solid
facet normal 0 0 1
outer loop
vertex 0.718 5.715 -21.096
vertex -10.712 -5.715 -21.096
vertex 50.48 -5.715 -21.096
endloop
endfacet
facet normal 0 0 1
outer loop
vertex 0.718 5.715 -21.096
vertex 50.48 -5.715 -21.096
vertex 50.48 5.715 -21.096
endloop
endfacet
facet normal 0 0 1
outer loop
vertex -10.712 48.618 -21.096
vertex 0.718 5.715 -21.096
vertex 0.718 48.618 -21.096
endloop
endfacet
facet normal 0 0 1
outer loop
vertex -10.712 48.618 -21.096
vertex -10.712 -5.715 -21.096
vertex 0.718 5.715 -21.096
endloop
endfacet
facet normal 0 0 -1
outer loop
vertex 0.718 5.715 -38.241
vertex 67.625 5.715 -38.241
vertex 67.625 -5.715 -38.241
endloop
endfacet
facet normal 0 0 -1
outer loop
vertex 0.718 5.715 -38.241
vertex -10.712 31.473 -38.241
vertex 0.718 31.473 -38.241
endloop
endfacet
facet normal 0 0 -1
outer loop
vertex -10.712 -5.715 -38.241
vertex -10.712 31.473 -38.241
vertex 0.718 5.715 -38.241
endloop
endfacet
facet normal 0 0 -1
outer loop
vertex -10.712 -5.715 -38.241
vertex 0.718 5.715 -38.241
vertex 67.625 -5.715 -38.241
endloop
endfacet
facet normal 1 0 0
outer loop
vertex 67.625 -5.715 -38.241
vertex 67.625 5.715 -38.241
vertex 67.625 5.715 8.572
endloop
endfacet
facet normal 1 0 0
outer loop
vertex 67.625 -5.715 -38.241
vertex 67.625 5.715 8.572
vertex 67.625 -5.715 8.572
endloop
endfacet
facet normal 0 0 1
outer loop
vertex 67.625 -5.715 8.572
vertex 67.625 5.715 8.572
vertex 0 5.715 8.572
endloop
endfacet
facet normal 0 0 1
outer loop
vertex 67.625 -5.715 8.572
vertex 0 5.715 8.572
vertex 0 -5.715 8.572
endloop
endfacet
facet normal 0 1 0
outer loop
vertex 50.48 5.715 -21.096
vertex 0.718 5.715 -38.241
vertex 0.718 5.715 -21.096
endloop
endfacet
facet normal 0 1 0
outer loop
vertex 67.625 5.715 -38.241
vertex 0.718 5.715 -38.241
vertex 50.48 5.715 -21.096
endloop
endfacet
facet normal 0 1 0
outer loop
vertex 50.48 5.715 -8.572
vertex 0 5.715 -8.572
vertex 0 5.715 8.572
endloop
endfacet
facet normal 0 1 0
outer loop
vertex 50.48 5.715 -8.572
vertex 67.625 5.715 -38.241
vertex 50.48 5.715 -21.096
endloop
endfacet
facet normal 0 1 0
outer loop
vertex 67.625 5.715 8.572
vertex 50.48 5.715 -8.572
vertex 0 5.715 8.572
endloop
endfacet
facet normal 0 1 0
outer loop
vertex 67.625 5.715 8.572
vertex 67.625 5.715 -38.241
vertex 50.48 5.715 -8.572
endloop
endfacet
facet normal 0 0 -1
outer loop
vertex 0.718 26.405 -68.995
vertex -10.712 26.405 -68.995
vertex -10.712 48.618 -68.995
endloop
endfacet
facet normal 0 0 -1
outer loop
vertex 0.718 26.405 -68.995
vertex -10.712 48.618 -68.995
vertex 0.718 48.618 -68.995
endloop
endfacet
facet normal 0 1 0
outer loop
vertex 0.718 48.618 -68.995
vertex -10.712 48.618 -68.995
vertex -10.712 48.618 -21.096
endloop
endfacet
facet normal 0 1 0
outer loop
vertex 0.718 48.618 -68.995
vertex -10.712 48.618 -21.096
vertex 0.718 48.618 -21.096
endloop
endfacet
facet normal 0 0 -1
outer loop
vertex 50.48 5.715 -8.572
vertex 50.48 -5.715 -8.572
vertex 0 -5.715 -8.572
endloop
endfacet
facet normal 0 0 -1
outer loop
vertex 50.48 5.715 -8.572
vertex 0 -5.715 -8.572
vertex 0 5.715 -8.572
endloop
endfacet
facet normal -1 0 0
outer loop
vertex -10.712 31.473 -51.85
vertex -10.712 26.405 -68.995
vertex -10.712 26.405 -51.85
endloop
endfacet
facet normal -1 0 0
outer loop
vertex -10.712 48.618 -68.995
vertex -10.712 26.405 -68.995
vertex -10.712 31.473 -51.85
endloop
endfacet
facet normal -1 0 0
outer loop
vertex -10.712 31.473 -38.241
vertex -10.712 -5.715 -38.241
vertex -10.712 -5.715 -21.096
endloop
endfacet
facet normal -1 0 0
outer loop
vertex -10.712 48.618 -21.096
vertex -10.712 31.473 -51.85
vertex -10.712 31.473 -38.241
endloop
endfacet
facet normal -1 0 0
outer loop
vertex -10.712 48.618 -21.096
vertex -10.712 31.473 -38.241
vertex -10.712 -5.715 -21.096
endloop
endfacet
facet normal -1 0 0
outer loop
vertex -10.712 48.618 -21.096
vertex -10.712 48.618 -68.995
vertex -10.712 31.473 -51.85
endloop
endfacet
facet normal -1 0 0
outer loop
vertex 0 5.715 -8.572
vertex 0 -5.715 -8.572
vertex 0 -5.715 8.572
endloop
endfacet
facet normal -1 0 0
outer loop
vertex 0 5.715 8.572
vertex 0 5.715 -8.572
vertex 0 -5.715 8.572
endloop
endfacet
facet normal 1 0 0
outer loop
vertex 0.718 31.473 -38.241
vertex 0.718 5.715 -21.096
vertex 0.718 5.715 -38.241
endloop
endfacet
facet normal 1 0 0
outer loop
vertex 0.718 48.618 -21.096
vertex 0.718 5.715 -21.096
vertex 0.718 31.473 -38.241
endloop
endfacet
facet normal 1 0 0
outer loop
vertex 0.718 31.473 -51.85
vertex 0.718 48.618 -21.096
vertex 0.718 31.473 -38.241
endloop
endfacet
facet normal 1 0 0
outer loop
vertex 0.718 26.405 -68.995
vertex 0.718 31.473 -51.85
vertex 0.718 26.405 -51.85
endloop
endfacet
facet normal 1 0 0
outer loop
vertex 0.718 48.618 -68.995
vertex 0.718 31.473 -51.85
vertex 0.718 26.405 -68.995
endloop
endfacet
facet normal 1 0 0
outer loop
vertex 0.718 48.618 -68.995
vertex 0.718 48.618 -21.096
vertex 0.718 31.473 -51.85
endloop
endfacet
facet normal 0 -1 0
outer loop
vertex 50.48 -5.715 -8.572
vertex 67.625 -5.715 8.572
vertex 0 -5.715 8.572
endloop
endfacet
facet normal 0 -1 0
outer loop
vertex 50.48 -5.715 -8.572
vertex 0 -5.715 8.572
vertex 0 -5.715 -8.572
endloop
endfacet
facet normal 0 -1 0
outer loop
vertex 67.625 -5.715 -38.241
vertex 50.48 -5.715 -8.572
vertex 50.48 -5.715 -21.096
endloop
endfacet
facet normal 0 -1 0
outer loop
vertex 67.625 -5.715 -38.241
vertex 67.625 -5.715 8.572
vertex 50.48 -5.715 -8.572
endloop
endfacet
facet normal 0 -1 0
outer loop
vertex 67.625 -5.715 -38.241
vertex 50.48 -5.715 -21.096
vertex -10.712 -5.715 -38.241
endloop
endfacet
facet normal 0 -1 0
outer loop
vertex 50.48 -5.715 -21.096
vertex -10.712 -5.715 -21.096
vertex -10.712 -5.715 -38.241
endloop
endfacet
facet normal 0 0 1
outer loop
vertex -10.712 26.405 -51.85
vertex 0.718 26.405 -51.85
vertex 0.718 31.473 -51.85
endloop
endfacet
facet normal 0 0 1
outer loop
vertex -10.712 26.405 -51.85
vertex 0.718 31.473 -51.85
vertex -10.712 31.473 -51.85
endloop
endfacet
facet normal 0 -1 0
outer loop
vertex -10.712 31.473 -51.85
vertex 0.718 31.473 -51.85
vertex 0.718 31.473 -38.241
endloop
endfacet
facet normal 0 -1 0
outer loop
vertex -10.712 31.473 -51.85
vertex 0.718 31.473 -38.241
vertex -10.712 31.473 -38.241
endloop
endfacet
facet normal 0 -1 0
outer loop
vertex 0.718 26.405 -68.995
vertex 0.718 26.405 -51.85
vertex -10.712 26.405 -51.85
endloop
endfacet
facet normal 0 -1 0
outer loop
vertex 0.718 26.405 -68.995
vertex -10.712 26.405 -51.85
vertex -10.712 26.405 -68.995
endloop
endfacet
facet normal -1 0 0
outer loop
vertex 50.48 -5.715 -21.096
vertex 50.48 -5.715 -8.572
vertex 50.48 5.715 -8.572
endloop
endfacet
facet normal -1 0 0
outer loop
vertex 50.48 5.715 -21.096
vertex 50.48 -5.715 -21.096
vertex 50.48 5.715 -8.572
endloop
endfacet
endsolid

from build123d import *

# Parameters (mm, degrees)
SKETCH2_W = 17.145
SKETCH2_H = 11.43


with BuildPart() as part:
    # Sweep1: sweep along a curve in space
    with BuildLine() as sweep1_path:
        Line((0, 0, 0), (59.052587147, 0, 0))
        Line((59.052587147, 0, 0), (59.052587147, 0, -29.66875879))
        Line((59.052587147, 0, -29.66875879), (-4.996664108, 0, -29.66875879))
        Line((-4.996664108, 0, -29.66875879), (-4.996664108, 40.045617421, -29.66875879))
        Line((-4.996664108, 40.045617421, -29.66875879), (-4.996664108, 40.045617421, -60.422953943))
        Line((-4.996664108, 40.045617421, -60.422953943), (-4.996664108, 26.405396034, -60.422953943))
    # Sketch2 → Sweep1 (sweep)
    with BuildSketch(Plane(origin=(0, 0, 0), x_dir=(0, 0, -1), z_dir=(1, 0, 0))):
        Rectangle(SKETCH2_W, SKETCH2_H)
    sweep(path=sweep1_path.line, transition=Transition.RIGHT)


solid = part.part
